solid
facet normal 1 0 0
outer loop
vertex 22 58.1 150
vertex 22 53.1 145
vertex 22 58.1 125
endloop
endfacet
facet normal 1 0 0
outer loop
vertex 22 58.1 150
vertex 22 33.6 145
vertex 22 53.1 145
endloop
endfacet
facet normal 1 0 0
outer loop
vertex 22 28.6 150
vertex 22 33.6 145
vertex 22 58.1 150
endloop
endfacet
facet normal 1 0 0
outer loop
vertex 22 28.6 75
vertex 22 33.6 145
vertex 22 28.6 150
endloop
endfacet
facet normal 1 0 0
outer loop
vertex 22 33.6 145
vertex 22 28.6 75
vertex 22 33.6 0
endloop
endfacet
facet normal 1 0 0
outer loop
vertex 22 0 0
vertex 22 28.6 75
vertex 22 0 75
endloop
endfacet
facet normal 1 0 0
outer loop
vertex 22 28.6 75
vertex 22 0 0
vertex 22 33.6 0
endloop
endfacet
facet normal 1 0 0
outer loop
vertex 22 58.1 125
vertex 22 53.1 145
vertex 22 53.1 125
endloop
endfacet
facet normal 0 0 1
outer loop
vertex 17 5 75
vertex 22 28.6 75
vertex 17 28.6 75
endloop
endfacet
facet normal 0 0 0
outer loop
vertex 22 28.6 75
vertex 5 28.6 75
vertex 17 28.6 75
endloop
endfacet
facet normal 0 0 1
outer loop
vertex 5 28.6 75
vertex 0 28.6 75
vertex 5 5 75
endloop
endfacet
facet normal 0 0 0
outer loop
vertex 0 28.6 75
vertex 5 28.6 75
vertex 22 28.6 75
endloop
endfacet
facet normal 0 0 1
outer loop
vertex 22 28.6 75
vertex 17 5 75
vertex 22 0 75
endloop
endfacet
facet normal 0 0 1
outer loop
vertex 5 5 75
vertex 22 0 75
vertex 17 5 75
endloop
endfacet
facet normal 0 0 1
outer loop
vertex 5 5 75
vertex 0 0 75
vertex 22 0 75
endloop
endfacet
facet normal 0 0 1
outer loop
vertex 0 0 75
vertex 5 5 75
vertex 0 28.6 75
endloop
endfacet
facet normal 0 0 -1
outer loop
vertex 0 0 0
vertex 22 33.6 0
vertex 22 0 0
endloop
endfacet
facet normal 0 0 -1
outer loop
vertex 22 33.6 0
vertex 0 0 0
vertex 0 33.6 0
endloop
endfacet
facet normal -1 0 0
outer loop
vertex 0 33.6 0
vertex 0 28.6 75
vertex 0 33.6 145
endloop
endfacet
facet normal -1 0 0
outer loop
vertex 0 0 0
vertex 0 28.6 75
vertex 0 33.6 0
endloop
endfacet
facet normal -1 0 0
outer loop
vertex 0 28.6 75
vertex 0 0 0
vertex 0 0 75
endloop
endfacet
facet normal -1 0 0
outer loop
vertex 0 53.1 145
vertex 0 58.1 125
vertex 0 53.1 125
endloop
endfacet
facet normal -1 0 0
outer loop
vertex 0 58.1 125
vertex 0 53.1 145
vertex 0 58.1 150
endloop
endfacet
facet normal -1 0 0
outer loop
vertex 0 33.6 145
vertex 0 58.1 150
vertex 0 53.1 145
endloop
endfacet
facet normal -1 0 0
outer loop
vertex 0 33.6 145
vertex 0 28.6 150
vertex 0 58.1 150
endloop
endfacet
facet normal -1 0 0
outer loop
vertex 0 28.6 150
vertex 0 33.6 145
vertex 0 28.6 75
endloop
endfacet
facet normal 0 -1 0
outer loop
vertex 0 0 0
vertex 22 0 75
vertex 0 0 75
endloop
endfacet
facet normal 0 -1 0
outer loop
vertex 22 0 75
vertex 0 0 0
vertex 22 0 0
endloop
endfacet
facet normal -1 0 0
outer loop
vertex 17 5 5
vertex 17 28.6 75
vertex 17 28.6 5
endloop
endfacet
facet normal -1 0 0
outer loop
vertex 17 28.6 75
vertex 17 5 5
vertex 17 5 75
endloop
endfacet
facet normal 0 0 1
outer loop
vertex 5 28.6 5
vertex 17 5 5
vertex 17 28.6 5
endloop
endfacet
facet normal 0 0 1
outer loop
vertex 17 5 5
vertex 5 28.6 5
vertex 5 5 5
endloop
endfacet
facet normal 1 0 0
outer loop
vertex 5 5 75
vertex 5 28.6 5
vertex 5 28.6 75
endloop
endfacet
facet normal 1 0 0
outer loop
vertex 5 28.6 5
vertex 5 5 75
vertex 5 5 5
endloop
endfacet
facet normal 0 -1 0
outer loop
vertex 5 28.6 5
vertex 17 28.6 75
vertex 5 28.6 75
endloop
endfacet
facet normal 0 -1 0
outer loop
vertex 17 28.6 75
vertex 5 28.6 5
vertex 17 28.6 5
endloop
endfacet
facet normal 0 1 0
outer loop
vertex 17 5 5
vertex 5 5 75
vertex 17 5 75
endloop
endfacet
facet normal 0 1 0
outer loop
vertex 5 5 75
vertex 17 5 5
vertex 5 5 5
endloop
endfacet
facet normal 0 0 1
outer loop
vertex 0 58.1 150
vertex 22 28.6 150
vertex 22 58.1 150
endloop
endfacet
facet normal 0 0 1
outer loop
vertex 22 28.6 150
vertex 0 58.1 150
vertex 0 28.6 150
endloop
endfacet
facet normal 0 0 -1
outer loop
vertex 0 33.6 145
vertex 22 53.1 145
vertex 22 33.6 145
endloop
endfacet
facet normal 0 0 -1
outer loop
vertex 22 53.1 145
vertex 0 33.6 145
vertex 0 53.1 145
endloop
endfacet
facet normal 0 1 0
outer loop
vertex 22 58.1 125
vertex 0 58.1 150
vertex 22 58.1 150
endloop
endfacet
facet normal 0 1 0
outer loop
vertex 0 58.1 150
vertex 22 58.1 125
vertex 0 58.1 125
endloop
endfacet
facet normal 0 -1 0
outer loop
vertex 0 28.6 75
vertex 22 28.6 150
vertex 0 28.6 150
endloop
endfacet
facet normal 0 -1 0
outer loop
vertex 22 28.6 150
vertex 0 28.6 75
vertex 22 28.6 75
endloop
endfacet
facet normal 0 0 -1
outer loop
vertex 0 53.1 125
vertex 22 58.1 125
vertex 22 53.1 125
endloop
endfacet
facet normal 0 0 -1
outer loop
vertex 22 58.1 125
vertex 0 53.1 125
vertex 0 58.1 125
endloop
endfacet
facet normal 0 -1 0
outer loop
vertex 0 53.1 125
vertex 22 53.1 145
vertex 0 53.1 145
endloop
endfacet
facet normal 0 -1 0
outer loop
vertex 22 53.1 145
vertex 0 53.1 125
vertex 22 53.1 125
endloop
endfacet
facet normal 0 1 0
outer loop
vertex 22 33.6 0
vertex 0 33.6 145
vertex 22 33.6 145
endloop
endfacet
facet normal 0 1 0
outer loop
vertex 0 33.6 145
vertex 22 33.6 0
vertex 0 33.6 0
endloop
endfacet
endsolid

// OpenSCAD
/*
  Landing Rail Dimensions
    Height: ~140.0mm
    Depth: 19.5mm

  Drier Arm Dimensions
    Height: ~70.0mm
    Width: ~12.0mm
    Depth: ~23.6mm
*/

railHeight = 140;
railDepth = 19.5;

armHeight = 70;
armWidth = 12;
armDepth = 23.6;

wallThickness = 5;


// Drier Arm Holder Piece
difference() {
  cube([armWidth + (2 * wallThickness), armDepth + (2 * wallThickness), armHeight + wallThickness]);

  translate([wallThickness, wallThickness, wallThickness]) {
    cube([armWidth, armDepth, armHeight]);
  }
}

// Railing Bracket
translate ([0, armDepth + wallThickness, 0]) {
  cube([armWidth + (2 * wallThickness), wallThickness, railHeight + (2 * wallThickness)]);
  // cube([armWidth + (2 * wallThickness), railDepth + (2 * wallThickness), wallThickness]);

  // translate([0, railDepth + wallThickness, 0]) {
  //   cube([armWidth + (2 * wallThickness), wallThickness, 5 * wallThickness]);
  // }

  translate([0, 0, railHeight + wallThickness]) {
    cube([armWidth + (2 * wallThickness), railDepth + (2 * wallThickness), wallThickness]);

    translate([0, railDepth + wallThickness, -(4 * wallThickness)]) {
      cube([armWidth + (2 * wallThickness), wallThickness, 5 * wallThickness]);
    }
  }
}
